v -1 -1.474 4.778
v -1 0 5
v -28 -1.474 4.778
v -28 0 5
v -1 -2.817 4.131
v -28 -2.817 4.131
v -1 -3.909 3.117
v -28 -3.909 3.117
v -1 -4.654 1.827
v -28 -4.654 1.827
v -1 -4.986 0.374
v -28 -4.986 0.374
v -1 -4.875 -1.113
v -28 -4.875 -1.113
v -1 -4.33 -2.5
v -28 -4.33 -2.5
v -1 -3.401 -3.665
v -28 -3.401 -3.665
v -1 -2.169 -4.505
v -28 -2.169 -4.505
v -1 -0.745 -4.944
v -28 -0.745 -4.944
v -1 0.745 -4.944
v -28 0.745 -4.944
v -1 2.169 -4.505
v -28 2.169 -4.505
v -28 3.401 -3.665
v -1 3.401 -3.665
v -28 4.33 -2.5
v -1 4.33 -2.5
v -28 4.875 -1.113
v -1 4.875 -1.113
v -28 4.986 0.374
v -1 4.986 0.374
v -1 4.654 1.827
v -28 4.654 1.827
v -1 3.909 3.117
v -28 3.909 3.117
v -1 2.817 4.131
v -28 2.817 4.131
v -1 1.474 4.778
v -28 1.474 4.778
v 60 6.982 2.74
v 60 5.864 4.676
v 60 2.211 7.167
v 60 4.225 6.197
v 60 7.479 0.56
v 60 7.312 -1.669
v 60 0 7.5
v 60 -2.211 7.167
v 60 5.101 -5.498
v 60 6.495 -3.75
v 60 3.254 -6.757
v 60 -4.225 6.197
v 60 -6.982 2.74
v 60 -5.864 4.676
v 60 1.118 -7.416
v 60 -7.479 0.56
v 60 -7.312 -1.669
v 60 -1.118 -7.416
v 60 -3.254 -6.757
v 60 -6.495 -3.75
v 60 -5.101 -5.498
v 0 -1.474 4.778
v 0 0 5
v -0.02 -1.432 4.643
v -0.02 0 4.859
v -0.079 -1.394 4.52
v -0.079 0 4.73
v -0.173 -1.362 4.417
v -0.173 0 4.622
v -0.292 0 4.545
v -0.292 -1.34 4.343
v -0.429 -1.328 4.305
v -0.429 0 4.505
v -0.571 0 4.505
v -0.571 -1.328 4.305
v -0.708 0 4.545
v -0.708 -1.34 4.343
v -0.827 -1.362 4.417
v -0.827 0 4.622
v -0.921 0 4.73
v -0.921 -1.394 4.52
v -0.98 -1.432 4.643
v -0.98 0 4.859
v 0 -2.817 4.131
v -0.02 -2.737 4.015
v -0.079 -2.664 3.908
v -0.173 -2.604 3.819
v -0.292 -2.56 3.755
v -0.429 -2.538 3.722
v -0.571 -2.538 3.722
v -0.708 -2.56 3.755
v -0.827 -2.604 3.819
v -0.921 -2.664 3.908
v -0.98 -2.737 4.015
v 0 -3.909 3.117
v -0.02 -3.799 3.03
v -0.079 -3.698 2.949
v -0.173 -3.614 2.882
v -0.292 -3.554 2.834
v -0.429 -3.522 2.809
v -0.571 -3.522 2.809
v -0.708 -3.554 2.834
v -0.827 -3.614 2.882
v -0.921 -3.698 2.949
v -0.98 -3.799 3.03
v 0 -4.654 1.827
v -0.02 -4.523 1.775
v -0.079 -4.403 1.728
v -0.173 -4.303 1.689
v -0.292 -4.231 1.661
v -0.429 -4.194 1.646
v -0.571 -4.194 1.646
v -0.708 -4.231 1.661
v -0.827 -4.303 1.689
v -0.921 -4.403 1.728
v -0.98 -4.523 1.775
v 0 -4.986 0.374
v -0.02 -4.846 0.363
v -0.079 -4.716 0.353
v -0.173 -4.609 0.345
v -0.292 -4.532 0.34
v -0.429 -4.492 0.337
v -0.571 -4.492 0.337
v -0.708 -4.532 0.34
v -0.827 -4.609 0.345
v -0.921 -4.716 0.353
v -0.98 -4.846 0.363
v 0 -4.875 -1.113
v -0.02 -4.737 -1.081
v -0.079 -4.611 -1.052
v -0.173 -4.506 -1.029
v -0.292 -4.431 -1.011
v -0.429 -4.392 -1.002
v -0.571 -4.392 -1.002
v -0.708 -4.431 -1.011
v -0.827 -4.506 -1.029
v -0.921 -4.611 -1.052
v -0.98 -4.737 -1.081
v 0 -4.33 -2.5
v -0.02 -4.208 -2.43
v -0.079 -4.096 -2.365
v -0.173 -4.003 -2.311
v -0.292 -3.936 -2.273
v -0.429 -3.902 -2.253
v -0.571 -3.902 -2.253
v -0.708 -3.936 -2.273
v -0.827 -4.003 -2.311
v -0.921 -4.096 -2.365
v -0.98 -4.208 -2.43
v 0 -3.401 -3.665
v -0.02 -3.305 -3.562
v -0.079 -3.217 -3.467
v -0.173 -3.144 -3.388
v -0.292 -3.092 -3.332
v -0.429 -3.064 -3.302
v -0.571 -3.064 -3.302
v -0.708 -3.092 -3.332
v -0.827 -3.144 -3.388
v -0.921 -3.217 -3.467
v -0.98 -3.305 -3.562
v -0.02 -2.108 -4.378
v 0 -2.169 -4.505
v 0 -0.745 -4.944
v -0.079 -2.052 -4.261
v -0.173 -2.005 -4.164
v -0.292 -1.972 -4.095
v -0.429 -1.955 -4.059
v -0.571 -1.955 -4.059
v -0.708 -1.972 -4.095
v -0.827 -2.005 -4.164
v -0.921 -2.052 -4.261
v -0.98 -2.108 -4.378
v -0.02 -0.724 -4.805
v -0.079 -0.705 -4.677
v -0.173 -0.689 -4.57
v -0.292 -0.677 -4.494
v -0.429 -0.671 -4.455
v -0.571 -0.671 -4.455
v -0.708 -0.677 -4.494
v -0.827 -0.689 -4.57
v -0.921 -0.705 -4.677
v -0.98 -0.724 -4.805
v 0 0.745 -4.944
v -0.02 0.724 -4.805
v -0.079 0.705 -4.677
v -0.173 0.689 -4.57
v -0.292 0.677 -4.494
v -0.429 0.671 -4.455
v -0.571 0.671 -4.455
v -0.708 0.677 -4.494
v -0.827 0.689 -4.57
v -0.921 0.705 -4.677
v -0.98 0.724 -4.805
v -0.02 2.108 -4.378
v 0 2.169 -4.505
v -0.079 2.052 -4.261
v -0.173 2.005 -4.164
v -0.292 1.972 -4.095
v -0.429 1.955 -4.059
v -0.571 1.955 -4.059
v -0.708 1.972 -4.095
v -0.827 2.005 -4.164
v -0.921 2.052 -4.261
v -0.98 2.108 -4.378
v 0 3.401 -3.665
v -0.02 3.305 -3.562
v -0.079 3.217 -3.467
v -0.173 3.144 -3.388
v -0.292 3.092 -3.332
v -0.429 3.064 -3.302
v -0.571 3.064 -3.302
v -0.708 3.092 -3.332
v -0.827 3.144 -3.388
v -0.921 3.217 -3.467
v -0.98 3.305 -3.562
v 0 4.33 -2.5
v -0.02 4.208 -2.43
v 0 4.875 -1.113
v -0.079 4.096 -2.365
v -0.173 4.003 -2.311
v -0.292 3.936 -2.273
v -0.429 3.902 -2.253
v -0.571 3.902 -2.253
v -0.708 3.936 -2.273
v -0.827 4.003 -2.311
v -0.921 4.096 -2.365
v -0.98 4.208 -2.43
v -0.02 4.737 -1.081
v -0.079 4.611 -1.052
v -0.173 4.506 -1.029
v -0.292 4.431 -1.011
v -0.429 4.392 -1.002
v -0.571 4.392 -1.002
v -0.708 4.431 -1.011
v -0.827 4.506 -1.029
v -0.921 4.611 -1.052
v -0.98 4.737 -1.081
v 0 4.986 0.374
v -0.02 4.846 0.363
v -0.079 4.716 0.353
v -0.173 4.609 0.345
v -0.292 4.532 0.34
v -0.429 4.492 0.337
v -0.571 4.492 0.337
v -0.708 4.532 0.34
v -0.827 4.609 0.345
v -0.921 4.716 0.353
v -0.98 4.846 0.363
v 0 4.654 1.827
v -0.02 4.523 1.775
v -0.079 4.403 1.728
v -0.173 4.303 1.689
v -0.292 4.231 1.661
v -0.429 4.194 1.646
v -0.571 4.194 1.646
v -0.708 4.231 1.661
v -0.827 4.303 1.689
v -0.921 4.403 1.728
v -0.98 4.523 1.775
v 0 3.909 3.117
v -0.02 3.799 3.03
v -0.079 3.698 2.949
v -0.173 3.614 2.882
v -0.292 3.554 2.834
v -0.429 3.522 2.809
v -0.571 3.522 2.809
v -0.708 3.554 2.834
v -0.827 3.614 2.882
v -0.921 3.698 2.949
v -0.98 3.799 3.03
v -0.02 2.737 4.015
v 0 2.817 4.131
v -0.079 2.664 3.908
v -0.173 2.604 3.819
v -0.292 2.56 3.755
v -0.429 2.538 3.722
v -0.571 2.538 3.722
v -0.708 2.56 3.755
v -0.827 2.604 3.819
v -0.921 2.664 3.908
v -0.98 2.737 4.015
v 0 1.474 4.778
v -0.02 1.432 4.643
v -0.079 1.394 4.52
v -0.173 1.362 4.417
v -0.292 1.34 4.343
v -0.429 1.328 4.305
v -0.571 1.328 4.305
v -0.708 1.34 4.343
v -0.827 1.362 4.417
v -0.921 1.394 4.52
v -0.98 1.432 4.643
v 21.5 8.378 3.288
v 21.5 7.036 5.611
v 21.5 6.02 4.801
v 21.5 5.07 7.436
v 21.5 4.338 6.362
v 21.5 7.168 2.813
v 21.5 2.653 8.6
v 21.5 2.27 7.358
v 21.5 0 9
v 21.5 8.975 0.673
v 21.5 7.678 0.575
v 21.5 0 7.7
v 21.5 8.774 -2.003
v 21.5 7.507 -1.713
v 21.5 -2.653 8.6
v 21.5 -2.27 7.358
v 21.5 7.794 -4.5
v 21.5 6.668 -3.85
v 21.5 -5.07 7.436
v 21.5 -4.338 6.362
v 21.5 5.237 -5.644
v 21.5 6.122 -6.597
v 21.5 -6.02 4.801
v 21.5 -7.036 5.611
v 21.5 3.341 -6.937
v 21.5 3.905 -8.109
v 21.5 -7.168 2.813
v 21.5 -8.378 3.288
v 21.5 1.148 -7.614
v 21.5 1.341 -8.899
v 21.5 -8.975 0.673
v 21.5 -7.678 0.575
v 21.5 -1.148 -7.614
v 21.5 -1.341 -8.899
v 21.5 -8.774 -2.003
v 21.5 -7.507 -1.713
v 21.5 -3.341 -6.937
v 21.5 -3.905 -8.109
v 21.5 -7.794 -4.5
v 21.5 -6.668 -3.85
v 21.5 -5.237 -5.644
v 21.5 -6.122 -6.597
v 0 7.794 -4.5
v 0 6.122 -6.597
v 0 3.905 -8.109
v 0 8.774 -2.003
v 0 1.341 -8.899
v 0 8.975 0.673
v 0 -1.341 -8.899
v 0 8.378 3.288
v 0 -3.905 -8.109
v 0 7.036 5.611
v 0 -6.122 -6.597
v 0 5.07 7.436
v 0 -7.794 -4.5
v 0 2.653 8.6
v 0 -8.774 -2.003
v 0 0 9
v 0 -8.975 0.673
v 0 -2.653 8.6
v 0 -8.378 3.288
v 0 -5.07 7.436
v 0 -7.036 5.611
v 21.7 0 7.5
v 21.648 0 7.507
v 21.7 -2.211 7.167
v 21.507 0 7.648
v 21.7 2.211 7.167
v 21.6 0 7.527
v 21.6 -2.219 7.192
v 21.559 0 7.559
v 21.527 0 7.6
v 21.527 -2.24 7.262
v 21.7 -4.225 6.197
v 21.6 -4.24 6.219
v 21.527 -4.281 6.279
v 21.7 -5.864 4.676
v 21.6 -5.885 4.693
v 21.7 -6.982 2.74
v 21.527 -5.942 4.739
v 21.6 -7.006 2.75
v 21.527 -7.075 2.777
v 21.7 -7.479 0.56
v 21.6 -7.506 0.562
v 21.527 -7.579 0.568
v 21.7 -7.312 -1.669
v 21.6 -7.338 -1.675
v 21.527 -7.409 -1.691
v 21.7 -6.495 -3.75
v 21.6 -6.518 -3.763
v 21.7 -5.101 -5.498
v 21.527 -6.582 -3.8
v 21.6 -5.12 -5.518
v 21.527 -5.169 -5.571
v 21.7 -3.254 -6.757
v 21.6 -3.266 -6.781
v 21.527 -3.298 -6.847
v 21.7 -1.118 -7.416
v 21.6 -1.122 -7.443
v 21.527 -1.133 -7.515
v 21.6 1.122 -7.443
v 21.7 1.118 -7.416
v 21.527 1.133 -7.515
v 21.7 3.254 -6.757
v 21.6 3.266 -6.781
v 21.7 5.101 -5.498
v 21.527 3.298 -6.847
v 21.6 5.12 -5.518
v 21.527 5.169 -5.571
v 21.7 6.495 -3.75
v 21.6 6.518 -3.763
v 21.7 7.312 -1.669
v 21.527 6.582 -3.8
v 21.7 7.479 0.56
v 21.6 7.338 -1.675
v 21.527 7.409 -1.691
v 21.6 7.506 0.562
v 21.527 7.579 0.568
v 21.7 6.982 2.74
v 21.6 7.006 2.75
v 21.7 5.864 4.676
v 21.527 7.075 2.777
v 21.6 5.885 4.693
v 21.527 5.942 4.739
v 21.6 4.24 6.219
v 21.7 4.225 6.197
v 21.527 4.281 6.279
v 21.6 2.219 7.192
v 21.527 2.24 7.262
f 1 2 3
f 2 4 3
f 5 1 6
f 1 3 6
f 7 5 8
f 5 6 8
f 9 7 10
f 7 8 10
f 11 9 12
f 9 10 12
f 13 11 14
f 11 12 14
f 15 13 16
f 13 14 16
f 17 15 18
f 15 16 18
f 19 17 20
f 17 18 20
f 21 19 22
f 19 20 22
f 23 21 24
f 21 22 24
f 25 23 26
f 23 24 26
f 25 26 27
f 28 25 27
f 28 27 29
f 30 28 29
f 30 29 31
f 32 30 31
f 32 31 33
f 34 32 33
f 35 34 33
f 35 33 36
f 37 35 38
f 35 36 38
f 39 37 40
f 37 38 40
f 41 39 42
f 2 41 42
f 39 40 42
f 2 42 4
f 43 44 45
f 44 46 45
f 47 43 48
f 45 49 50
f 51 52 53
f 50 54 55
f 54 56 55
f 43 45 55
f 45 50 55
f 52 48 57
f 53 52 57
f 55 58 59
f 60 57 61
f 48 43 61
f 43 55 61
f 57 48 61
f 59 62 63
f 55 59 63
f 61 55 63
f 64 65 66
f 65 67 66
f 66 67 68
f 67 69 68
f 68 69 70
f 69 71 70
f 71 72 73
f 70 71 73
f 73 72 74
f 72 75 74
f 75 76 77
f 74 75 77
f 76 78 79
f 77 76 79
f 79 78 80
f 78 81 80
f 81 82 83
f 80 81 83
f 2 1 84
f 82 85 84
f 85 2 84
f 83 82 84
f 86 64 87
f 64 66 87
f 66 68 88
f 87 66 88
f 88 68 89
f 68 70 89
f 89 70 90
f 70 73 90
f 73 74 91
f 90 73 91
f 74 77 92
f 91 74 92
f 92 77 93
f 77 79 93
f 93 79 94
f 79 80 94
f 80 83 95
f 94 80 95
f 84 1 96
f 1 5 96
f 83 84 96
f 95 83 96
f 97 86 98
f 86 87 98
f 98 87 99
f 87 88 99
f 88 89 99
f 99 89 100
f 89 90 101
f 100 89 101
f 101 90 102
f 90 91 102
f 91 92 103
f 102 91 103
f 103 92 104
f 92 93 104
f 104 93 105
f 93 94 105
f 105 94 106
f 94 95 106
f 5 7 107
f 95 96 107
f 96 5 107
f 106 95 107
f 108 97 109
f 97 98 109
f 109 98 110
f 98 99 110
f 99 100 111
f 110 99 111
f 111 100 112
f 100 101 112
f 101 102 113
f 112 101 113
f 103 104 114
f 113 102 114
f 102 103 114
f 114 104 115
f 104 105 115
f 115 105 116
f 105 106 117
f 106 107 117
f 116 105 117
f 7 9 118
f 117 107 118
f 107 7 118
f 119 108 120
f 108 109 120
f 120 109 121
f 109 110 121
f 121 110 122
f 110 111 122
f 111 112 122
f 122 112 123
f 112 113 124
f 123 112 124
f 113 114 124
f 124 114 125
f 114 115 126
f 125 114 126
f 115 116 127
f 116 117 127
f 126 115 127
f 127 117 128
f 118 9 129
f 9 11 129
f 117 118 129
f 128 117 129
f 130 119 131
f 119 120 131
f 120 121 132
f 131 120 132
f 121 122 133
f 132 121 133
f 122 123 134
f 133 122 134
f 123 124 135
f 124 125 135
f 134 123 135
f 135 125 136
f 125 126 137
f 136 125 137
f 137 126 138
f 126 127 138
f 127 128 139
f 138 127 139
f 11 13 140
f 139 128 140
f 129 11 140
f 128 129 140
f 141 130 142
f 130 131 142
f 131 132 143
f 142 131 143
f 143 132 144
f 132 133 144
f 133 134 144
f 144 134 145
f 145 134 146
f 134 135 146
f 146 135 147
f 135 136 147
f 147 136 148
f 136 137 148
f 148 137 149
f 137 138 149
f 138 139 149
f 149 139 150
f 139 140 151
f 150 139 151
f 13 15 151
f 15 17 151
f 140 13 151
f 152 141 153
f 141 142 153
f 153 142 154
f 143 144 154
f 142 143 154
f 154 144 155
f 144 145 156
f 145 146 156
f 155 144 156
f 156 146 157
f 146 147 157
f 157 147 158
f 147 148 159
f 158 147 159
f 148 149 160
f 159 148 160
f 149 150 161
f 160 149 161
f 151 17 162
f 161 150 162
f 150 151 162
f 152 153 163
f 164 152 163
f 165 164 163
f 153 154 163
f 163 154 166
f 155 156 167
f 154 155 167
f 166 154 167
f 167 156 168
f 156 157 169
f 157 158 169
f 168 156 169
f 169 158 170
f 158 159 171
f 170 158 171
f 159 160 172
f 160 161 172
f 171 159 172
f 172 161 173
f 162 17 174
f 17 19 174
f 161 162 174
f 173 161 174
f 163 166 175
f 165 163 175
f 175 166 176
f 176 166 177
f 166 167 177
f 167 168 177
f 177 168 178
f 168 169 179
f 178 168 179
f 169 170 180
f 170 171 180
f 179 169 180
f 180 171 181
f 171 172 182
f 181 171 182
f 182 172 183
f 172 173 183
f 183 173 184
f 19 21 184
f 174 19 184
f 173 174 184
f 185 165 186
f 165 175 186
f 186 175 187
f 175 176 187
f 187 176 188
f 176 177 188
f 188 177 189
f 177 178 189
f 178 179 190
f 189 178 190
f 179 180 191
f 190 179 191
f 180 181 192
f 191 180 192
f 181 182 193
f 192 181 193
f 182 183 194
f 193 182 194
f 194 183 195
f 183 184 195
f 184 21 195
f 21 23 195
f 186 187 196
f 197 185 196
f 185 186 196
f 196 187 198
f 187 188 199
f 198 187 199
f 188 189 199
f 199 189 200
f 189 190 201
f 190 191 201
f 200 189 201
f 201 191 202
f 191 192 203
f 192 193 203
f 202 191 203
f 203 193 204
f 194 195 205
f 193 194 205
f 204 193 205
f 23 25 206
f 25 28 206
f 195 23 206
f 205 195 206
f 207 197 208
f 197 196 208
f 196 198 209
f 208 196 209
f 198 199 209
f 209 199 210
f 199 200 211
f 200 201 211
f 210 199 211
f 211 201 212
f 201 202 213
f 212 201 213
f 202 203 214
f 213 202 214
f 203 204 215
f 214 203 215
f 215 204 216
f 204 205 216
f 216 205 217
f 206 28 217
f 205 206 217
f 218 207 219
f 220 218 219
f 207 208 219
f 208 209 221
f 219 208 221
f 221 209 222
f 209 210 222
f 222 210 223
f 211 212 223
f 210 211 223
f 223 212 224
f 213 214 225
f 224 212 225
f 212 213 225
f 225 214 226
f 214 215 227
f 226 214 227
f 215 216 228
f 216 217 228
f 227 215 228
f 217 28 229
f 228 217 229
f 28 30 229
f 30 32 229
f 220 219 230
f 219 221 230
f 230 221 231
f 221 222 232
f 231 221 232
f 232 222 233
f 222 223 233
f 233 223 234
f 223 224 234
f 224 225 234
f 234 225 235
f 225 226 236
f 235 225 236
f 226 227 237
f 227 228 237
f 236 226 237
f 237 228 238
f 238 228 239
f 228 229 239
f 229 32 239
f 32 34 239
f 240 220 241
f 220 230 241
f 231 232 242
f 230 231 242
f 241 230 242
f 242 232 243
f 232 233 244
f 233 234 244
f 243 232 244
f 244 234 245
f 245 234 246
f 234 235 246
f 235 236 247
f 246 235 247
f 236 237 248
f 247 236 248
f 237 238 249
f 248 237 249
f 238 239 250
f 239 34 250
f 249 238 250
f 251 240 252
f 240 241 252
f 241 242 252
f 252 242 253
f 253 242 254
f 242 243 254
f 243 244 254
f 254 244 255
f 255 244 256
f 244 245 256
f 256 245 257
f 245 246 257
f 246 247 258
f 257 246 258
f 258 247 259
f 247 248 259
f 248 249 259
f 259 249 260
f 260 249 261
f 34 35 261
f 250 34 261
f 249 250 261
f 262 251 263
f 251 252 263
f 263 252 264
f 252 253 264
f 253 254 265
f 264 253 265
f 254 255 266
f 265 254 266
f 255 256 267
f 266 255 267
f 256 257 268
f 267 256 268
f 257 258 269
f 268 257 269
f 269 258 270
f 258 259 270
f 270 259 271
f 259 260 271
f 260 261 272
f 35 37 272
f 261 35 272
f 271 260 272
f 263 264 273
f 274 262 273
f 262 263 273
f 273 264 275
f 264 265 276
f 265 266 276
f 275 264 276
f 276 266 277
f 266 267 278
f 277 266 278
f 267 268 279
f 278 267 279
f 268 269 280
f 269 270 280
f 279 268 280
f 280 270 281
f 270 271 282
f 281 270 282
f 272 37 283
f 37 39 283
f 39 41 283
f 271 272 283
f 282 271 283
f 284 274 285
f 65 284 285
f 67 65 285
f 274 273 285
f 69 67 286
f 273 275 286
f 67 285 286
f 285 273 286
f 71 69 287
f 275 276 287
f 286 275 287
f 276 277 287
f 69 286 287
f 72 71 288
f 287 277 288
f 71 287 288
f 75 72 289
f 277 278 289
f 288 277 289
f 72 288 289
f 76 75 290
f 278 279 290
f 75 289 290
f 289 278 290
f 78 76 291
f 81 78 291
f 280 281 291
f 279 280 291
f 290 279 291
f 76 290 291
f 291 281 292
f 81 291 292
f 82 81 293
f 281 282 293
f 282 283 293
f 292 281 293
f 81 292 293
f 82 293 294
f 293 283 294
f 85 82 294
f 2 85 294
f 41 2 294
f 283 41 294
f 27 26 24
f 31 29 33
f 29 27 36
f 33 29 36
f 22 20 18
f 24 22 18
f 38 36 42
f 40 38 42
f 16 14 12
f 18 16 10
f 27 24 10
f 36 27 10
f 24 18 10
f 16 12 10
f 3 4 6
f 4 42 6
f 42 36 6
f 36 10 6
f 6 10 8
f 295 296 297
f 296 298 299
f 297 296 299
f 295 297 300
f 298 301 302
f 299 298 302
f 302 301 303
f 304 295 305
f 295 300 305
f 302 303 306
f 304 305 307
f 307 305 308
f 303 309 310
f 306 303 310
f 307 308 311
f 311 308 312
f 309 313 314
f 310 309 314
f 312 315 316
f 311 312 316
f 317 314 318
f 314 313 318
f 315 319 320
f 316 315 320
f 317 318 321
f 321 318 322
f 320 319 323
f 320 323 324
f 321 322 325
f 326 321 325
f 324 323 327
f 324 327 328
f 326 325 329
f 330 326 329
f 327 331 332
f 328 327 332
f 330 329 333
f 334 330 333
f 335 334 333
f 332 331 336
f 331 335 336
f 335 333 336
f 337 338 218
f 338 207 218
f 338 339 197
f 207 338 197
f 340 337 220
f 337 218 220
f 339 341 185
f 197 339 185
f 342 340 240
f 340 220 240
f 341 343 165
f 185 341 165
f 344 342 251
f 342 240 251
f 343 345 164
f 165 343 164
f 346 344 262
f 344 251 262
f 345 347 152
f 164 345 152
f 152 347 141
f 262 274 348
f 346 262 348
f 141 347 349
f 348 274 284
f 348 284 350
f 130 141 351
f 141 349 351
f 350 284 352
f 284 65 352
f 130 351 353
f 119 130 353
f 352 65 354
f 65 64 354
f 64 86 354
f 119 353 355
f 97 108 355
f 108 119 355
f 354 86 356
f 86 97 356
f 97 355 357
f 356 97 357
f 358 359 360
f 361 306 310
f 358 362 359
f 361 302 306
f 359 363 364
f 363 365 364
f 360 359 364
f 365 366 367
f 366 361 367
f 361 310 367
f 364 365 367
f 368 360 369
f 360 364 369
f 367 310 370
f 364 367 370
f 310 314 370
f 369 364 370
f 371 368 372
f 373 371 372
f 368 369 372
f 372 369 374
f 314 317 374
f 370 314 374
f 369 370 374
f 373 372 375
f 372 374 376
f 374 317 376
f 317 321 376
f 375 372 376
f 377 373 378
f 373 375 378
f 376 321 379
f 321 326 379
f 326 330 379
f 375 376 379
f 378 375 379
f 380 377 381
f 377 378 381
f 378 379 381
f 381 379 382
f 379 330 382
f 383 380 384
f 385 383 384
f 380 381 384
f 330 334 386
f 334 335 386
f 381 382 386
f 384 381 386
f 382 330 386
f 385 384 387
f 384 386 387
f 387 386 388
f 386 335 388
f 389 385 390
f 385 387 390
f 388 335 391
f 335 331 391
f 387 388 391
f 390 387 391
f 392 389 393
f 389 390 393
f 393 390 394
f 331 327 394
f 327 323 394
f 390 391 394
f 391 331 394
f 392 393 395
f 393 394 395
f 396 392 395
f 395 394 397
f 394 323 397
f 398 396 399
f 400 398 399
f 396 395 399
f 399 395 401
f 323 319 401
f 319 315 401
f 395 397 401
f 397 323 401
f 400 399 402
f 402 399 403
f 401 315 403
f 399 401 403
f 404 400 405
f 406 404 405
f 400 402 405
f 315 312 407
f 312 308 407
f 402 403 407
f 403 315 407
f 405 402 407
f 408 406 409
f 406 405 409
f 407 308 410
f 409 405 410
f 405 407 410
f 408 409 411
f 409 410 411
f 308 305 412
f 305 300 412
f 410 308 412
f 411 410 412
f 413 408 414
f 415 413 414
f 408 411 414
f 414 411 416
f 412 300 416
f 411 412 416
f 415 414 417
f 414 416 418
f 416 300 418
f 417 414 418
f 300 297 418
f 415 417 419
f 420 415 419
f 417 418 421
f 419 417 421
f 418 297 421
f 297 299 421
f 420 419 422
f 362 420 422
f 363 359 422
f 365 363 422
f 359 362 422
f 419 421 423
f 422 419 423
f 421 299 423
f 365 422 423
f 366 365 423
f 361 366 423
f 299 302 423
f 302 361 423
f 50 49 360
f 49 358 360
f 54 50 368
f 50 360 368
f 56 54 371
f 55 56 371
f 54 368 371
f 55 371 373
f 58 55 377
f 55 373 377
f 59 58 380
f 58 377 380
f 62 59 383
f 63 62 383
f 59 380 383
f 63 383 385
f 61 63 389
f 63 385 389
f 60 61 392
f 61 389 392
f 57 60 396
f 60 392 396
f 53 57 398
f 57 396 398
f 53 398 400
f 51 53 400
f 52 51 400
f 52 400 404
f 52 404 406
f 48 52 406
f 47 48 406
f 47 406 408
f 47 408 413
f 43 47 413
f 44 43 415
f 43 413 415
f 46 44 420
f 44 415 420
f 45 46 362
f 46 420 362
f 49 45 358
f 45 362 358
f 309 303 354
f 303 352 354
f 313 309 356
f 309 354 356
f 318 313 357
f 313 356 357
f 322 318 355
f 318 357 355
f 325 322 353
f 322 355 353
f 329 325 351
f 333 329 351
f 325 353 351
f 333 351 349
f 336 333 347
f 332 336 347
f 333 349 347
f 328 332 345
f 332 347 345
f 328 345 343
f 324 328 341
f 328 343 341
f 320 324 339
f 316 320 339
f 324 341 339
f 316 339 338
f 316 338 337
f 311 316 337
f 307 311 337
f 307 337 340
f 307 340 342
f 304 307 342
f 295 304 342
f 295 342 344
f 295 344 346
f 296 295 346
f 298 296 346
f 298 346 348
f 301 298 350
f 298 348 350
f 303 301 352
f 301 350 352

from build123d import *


with BuildPart() as part:
    # Sketch1 → Revolve1 (revolve)
    with BuildSketch(Plane.XY, mode=Mode.PRIVATE) as revolve1_sk:
        with BuildLine():
            Line((-1, 5), (-28, 5))
            Line((-28, 5), (-28, 0))
            Line((-28, 0), (60, 0))
            Line((60, 0), (60, 7.5))
            Line((60, 7.5), (21.7, 7.5))
            ThreePointArc((21.7, 7.5), (21.558578644, 7.558578644), (21.5, 7.7))
            Line((21.5, 7.7), (21.5, 9))
            Line((21.5, 9), (0, 9))
            Line((0, 9), (0, 5))
            ThreePointArc((0, 5), (-0.5, 4.5), (-1, 5))
        make_face()
    revolve(revolve1_sk.sketch.rotate(Axis((-49.812651096, 0, 0), (1, 0, 0)), 90), axis=Axis((-49.812651096, 0, 0), (1, 0, 0)))  # turned: the seam where the file's is


solid = part.part
